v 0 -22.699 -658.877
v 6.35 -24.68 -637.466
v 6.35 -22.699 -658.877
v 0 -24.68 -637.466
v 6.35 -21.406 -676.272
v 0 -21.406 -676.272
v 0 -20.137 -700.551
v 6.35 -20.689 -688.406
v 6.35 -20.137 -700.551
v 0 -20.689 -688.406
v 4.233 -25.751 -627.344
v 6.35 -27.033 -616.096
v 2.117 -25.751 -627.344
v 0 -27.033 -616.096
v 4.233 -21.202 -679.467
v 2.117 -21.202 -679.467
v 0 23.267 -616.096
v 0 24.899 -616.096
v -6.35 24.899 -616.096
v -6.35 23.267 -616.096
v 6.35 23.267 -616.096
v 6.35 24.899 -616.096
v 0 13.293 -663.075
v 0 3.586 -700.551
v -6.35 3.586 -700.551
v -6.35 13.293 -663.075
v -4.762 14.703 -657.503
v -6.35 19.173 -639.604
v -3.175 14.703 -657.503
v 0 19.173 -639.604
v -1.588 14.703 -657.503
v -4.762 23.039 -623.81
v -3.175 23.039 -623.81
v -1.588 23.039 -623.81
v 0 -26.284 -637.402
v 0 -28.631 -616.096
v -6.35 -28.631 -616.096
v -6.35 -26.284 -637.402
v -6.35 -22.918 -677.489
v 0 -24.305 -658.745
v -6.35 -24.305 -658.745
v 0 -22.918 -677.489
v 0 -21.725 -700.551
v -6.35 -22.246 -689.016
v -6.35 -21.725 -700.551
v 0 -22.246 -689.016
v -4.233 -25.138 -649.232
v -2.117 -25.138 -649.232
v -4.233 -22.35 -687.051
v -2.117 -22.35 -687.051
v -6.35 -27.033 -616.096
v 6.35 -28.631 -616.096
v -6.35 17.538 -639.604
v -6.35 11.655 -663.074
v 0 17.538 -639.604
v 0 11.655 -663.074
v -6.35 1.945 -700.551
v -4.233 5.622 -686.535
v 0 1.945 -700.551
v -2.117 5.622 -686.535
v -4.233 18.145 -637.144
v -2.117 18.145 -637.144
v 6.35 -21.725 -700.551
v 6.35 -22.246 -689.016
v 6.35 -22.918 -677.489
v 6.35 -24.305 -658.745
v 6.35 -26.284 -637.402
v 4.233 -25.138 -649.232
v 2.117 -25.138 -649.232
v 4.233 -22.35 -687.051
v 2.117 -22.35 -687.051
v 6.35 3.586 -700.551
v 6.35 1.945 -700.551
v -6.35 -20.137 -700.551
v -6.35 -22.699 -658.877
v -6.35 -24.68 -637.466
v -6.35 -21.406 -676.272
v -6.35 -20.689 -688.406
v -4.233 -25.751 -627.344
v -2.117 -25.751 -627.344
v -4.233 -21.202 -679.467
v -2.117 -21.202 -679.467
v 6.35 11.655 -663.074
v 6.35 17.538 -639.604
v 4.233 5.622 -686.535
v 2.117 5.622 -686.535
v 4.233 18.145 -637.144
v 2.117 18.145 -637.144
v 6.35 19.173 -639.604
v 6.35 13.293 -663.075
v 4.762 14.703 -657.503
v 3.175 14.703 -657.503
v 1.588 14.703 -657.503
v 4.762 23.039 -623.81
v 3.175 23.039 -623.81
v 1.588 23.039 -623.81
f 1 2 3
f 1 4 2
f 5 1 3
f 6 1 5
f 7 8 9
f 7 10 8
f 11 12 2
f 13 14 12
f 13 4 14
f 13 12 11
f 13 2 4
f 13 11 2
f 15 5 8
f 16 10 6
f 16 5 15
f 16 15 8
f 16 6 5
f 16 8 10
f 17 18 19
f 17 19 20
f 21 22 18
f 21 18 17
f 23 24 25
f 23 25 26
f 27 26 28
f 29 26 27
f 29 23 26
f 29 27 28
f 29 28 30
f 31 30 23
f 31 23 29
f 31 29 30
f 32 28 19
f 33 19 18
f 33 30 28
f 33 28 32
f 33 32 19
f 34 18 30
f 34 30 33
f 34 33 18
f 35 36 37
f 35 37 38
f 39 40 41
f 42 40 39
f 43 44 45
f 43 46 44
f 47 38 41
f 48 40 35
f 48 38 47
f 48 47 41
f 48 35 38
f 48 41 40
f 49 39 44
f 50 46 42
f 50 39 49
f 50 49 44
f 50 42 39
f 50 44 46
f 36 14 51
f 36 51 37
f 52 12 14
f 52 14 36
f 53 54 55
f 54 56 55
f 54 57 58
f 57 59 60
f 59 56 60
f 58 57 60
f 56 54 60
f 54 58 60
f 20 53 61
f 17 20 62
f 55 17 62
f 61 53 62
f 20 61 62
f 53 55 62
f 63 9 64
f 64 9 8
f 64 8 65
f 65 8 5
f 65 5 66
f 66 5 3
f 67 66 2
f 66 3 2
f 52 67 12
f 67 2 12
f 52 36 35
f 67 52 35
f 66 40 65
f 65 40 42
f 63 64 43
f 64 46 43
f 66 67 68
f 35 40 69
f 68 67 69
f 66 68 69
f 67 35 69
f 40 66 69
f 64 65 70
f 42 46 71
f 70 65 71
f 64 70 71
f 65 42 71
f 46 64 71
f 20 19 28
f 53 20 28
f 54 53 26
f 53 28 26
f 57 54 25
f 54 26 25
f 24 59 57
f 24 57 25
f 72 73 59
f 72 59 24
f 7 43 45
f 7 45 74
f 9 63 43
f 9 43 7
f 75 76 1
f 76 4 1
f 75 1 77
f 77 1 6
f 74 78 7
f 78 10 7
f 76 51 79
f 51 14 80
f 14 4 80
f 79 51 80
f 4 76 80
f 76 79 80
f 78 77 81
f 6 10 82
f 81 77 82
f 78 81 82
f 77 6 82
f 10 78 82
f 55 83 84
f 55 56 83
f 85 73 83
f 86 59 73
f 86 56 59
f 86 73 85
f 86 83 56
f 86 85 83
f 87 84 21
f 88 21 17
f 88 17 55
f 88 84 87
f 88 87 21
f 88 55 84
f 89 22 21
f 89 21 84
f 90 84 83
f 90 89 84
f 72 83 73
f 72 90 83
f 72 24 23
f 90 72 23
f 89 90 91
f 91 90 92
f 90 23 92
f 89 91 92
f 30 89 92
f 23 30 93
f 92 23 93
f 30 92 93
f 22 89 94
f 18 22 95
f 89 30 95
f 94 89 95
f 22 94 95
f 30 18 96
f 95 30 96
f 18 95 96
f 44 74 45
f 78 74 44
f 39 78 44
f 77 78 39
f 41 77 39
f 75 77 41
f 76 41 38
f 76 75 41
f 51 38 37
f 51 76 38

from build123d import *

# Parameters (mm, degrees)
BOSS_EXTRUDE1_DEPTH   = 6.35
BOSS_EXTRUDE1_2_DEPTH = 6.35


with BuildPart() as part:
    # Sketch1 → Boss-Extrude1 (new, symmetric)
    with BuildSketch(Plane(origin=(0, 0, 0), x_dir=(0, 0, -1), z_dir=(1, 0, 0))):
        with BuildLine():
            add(Edge.make_bspline(
                [(700.551053399, 3.586222224), (696.579883466, 4.636636464), (682.245101169, 8.399180811), (656.683490083, 14.958443735), (632.486605738, 20.949027091), (618.668198685, 24.282047812), (616.096053399, 24.899291701)],
                knots=[0.12762815, 0.12762815, 0.12762815, 0.12762815, 0.142399413, 0.180921149, 0.22252468, 0.232036611, 0.232036611, 0.232036611, 0.232036611], degree=3))
            Line((616.096053399, 24.899291701), (616.096053399, 23.267161102))
            add(Edge.make_bspline(
                [(700.551053399, 1.94501203), (695.881809342, 3.180712118), (674.780157381, 8.712406077), (646.635186109, 15.855600566), (623.117202697, 21.581456041), (616.096053399, 23.267161102)],
                knots=[0.127124743, 0.127124743, 0.127124743, 0.127124743, 0.144501553, 0.205602504, 0.23157986, 0.23157986, 0.23157986, 0.23157986], degree=3))
            Line((700.551053399, 1.94501203), (700.551053399, 3.586222224))
        make_face()
    extrude(amount=BOSS_EXTRUDE1_DEPTH, both=True)


with BuildPart() as body_2:
    # Sketch1 → Boss-Extrude1 2 (new, symmetric)
    with BuildSketch(Plane(origin=(0, 0, 0), x_dir=(0, 0, -1), z_dir=(1, 0, 0))):
        with BuildLine():
            add(Edge.make_bspline(
                [(616.096053399, -27.032599118), (619.843416737, -26.59006582), (640.917655955, -24.186794667), (669.061650625, -21.654412481), (693.517861944, -20.40563301), (700.551053399, -20.137154854)],
                knots=[0.781625644, 0.781625644, 0.781625644, 0.781625644, 0.794856204, 0.855992653, 0.880649492, 0.880649492, 0.880649492, 0.880649492], degree=3))
            Line((616.096053399, -27.032599118), (616.096053399, -28.630805543))
            add(Edge.make_bspline(
                [(616.096053399, -28.630805543), (627.126031636, -27.326648957), (650.742691726, -24.817450392), (678.920902179, -22.694532397), (696.049354723, -21.896959145), (700.551053399, -21.725128402)],
                knots=[0.781406307, 0.781406307, 0.781406307, 0.781406307, 0.820393483, 0.864765923, 0.880578814, 0.880578814, 0.880578814, 0.880578814], degree=3))
            Line((700.551053399, -21.725128402), (700.551053399, -20.137154854))
        make_face()
    extrude(amount=BOSS_EXTRUDE1_2_DEPTH, both=True)


solid = Compound([part.part, body_2.part])
